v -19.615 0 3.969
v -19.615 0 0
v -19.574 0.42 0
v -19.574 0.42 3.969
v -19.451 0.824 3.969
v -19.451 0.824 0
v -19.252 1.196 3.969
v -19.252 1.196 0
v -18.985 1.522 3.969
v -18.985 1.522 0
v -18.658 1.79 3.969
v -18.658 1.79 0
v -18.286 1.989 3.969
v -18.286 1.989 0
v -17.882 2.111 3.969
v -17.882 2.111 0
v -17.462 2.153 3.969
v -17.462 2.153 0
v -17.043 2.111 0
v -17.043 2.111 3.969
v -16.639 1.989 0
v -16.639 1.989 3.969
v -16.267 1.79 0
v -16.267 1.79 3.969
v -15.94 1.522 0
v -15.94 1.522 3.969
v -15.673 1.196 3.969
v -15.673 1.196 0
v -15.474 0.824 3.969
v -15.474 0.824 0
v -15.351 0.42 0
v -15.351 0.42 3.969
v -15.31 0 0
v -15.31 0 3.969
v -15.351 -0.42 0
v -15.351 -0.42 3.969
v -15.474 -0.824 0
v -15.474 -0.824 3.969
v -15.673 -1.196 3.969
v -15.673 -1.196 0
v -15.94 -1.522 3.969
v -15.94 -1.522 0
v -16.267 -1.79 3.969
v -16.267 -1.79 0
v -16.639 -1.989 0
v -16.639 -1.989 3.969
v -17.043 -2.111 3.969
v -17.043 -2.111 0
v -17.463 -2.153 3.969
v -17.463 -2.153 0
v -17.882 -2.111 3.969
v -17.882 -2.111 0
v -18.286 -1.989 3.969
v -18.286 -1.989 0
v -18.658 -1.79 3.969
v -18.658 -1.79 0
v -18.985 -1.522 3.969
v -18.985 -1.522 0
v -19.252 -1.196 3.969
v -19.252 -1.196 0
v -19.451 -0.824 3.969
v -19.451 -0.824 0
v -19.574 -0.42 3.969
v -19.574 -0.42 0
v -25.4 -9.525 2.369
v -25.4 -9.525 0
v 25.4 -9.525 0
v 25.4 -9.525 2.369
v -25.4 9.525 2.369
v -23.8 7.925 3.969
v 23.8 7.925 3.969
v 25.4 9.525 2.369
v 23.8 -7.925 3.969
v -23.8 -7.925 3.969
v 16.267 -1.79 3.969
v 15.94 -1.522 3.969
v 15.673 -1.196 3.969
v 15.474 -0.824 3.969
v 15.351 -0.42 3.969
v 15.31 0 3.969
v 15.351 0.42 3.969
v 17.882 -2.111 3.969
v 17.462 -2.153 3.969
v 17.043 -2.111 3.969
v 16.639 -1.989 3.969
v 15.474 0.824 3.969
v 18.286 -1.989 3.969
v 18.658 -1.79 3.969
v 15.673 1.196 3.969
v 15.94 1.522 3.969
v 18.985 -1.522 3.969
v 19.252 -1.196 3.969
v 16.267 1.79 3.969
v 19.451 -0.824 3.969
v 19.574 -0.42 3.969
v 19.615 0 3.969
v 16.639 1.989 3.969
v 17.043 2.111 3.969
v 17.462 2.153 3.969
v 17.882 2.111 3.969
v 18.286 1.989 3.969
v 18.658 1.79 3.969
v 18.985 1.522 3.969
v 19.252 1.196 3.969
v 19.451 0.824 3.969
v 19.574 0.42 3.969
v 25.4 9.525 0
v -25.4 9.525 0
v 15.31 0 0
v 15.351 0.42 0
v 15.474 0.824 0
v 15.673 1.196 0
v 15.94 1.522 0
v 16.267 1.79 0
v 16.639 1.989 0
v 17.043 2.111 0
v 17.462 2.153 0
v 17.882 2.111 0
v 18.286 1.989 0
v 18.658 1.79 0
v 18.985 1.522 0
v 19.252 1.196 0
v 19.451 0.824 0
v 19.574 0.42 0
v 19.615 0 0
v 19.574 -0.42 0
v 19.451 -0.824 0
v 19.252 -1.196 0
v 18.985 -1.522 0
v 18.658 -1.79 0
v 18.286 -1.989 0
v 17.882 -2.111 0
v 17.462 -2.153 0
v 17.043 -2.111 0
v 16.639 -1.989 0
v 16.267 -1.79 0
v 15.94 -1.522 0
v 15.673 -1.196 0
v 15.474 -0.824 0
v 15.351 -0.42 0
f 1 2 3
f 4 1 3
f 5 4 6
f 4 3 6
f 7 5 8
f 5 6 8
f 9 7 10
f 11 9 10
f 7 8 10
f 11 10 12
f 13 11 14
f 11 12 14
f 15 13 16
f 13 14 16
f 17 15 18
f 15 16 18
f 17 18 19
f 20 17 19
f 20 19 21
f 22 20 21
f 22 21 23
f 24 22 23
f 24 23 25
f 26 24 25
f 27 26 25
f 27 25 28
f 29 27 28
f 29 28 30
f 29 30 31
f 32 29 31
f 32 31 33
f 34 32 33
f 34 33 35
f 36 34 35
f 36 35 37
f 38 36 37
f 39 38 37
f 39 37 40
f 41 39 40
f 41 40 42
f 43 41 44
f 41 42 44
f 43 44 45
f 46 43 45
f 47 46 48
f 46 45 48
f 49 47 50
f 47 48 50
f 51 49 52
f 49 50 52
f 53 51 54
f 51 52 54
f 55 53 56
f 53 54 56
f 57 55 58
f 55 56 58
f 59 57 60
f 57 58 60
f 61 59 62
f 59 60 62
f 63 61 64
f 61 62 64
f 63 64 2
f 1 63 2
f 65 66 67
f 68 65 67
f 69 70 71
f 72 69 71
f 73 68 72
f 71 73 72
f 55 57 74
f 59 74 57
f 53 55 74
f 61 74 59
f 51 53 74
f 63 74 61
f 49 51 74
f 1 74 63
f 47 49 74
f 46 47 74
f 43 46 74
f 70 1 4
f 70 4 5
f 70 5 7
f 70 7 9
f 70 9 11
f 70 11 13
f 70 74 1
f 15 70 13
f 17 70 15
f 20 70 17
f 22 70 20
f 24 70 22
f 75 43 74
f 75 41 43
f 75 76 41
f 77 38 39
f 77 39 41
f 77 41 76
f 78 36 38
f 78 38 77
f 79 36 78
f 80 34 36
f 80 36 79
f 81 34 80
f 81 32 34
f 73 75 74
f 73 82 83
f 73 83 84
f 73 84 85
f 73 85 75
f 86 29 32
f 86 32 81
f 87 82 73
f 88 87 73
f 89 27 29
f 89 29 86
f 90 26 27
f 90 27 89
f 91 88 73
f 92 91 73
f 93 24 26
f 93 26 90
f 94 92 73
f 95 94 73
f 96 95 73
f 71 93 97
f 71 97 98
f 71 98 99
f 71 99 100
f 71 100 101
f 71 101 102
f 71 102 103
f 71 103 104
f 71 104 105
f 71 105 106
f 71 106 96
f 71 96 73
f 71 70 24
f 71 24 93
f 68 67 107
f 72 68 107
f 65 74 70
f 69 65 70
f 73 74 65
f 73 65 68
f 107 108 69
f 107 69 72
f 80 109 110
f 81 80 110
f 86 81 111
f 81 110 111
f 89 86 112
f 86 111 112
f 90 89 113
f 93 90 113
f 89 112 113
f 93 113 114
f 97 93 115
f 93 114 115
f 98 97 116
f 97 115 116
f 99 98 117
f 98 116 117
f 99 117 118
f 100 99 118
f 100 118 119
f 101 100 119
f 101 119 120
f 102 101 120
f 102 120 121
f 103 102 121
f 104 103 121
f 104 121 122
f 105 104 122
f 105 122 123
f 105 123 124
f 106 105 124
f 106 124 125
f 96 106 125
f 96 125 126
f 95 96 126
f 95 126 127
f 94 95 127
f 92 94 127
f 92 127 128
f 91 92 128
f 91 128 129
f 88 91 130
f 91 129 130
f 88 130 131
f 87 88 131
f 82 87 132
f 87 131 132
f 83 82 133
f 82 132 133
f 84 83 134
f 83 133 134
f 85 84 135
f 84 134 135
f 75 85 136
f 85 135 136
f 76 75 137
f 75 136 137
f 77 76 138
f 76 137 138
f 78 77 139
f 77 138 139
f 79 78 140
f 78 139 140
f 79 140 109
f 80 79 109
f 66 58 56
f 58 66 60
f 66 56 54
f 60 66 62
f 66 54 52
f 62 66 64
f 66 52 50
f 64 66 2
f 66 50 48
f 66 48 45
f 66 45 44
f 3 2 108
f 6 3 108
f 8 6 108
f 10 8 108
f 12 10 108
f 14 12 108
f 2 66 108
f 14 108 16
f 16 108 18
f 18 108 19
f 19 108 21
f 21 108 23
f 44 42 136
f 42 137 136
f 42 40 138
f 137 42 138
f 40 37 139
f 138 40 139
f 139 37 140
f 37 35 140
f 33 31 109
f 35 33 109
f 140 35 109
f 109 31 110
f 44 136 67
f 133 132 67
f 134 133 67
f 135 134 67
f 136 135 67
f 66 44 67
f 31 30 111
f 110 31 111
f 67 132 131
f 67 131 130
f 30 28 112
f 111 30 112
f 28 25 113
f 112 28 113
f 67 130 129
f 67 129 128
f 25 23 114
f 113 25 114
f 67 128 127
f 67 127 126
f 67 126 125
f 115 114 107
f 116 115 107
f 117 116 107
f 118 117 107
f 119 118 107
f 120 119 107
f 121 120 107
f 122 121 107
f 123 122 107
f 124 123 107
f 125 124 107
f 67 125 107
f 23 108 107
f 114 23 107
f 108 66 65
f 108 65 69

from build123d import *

# Parameters (mm, degrees)
SKETCH2_W             = 50.8
SKETCH2_H             = 19.05
BOSS_EXTRUDE1_DEPTH   = 3.96875
F_8_CLEARANCE_HOLE1_D = 4.3053
CHAMFER1_SIZE         = 1.6002


with BuildPart() as part:
    # Sketch2 → Boss-Extrude1 (new body)
    with BuildSketch(Plane.XY):
        Rectangle(SKETCH2_W, SKETCH2_H)
    extrude(amount=BOSS_EXTRUDE1_DEPTH)

    # #8 Clearance Hole1 (through all)
    with Locations(Plane.XY.offset(3.96875)):
        with Locations((-17.4625, 0), (17.4625, 0)):
            Hole(F_8_CLEARANCE_HOLE1_D / 2)

    # Chamfer1
    chamfer1_edges = [part.edges().sort_by_distance(p)[0] for p in [
        (-25.4, 0, 3.96875),
        (0, -9.525, 3.96875),
        (25.4, 0, 3.96875),
        (0, 9.525, 3.96875),
    ]]
    chamfer(chamfer1_edges, length=CHAMFER1_SIZE)


solid = part.part
